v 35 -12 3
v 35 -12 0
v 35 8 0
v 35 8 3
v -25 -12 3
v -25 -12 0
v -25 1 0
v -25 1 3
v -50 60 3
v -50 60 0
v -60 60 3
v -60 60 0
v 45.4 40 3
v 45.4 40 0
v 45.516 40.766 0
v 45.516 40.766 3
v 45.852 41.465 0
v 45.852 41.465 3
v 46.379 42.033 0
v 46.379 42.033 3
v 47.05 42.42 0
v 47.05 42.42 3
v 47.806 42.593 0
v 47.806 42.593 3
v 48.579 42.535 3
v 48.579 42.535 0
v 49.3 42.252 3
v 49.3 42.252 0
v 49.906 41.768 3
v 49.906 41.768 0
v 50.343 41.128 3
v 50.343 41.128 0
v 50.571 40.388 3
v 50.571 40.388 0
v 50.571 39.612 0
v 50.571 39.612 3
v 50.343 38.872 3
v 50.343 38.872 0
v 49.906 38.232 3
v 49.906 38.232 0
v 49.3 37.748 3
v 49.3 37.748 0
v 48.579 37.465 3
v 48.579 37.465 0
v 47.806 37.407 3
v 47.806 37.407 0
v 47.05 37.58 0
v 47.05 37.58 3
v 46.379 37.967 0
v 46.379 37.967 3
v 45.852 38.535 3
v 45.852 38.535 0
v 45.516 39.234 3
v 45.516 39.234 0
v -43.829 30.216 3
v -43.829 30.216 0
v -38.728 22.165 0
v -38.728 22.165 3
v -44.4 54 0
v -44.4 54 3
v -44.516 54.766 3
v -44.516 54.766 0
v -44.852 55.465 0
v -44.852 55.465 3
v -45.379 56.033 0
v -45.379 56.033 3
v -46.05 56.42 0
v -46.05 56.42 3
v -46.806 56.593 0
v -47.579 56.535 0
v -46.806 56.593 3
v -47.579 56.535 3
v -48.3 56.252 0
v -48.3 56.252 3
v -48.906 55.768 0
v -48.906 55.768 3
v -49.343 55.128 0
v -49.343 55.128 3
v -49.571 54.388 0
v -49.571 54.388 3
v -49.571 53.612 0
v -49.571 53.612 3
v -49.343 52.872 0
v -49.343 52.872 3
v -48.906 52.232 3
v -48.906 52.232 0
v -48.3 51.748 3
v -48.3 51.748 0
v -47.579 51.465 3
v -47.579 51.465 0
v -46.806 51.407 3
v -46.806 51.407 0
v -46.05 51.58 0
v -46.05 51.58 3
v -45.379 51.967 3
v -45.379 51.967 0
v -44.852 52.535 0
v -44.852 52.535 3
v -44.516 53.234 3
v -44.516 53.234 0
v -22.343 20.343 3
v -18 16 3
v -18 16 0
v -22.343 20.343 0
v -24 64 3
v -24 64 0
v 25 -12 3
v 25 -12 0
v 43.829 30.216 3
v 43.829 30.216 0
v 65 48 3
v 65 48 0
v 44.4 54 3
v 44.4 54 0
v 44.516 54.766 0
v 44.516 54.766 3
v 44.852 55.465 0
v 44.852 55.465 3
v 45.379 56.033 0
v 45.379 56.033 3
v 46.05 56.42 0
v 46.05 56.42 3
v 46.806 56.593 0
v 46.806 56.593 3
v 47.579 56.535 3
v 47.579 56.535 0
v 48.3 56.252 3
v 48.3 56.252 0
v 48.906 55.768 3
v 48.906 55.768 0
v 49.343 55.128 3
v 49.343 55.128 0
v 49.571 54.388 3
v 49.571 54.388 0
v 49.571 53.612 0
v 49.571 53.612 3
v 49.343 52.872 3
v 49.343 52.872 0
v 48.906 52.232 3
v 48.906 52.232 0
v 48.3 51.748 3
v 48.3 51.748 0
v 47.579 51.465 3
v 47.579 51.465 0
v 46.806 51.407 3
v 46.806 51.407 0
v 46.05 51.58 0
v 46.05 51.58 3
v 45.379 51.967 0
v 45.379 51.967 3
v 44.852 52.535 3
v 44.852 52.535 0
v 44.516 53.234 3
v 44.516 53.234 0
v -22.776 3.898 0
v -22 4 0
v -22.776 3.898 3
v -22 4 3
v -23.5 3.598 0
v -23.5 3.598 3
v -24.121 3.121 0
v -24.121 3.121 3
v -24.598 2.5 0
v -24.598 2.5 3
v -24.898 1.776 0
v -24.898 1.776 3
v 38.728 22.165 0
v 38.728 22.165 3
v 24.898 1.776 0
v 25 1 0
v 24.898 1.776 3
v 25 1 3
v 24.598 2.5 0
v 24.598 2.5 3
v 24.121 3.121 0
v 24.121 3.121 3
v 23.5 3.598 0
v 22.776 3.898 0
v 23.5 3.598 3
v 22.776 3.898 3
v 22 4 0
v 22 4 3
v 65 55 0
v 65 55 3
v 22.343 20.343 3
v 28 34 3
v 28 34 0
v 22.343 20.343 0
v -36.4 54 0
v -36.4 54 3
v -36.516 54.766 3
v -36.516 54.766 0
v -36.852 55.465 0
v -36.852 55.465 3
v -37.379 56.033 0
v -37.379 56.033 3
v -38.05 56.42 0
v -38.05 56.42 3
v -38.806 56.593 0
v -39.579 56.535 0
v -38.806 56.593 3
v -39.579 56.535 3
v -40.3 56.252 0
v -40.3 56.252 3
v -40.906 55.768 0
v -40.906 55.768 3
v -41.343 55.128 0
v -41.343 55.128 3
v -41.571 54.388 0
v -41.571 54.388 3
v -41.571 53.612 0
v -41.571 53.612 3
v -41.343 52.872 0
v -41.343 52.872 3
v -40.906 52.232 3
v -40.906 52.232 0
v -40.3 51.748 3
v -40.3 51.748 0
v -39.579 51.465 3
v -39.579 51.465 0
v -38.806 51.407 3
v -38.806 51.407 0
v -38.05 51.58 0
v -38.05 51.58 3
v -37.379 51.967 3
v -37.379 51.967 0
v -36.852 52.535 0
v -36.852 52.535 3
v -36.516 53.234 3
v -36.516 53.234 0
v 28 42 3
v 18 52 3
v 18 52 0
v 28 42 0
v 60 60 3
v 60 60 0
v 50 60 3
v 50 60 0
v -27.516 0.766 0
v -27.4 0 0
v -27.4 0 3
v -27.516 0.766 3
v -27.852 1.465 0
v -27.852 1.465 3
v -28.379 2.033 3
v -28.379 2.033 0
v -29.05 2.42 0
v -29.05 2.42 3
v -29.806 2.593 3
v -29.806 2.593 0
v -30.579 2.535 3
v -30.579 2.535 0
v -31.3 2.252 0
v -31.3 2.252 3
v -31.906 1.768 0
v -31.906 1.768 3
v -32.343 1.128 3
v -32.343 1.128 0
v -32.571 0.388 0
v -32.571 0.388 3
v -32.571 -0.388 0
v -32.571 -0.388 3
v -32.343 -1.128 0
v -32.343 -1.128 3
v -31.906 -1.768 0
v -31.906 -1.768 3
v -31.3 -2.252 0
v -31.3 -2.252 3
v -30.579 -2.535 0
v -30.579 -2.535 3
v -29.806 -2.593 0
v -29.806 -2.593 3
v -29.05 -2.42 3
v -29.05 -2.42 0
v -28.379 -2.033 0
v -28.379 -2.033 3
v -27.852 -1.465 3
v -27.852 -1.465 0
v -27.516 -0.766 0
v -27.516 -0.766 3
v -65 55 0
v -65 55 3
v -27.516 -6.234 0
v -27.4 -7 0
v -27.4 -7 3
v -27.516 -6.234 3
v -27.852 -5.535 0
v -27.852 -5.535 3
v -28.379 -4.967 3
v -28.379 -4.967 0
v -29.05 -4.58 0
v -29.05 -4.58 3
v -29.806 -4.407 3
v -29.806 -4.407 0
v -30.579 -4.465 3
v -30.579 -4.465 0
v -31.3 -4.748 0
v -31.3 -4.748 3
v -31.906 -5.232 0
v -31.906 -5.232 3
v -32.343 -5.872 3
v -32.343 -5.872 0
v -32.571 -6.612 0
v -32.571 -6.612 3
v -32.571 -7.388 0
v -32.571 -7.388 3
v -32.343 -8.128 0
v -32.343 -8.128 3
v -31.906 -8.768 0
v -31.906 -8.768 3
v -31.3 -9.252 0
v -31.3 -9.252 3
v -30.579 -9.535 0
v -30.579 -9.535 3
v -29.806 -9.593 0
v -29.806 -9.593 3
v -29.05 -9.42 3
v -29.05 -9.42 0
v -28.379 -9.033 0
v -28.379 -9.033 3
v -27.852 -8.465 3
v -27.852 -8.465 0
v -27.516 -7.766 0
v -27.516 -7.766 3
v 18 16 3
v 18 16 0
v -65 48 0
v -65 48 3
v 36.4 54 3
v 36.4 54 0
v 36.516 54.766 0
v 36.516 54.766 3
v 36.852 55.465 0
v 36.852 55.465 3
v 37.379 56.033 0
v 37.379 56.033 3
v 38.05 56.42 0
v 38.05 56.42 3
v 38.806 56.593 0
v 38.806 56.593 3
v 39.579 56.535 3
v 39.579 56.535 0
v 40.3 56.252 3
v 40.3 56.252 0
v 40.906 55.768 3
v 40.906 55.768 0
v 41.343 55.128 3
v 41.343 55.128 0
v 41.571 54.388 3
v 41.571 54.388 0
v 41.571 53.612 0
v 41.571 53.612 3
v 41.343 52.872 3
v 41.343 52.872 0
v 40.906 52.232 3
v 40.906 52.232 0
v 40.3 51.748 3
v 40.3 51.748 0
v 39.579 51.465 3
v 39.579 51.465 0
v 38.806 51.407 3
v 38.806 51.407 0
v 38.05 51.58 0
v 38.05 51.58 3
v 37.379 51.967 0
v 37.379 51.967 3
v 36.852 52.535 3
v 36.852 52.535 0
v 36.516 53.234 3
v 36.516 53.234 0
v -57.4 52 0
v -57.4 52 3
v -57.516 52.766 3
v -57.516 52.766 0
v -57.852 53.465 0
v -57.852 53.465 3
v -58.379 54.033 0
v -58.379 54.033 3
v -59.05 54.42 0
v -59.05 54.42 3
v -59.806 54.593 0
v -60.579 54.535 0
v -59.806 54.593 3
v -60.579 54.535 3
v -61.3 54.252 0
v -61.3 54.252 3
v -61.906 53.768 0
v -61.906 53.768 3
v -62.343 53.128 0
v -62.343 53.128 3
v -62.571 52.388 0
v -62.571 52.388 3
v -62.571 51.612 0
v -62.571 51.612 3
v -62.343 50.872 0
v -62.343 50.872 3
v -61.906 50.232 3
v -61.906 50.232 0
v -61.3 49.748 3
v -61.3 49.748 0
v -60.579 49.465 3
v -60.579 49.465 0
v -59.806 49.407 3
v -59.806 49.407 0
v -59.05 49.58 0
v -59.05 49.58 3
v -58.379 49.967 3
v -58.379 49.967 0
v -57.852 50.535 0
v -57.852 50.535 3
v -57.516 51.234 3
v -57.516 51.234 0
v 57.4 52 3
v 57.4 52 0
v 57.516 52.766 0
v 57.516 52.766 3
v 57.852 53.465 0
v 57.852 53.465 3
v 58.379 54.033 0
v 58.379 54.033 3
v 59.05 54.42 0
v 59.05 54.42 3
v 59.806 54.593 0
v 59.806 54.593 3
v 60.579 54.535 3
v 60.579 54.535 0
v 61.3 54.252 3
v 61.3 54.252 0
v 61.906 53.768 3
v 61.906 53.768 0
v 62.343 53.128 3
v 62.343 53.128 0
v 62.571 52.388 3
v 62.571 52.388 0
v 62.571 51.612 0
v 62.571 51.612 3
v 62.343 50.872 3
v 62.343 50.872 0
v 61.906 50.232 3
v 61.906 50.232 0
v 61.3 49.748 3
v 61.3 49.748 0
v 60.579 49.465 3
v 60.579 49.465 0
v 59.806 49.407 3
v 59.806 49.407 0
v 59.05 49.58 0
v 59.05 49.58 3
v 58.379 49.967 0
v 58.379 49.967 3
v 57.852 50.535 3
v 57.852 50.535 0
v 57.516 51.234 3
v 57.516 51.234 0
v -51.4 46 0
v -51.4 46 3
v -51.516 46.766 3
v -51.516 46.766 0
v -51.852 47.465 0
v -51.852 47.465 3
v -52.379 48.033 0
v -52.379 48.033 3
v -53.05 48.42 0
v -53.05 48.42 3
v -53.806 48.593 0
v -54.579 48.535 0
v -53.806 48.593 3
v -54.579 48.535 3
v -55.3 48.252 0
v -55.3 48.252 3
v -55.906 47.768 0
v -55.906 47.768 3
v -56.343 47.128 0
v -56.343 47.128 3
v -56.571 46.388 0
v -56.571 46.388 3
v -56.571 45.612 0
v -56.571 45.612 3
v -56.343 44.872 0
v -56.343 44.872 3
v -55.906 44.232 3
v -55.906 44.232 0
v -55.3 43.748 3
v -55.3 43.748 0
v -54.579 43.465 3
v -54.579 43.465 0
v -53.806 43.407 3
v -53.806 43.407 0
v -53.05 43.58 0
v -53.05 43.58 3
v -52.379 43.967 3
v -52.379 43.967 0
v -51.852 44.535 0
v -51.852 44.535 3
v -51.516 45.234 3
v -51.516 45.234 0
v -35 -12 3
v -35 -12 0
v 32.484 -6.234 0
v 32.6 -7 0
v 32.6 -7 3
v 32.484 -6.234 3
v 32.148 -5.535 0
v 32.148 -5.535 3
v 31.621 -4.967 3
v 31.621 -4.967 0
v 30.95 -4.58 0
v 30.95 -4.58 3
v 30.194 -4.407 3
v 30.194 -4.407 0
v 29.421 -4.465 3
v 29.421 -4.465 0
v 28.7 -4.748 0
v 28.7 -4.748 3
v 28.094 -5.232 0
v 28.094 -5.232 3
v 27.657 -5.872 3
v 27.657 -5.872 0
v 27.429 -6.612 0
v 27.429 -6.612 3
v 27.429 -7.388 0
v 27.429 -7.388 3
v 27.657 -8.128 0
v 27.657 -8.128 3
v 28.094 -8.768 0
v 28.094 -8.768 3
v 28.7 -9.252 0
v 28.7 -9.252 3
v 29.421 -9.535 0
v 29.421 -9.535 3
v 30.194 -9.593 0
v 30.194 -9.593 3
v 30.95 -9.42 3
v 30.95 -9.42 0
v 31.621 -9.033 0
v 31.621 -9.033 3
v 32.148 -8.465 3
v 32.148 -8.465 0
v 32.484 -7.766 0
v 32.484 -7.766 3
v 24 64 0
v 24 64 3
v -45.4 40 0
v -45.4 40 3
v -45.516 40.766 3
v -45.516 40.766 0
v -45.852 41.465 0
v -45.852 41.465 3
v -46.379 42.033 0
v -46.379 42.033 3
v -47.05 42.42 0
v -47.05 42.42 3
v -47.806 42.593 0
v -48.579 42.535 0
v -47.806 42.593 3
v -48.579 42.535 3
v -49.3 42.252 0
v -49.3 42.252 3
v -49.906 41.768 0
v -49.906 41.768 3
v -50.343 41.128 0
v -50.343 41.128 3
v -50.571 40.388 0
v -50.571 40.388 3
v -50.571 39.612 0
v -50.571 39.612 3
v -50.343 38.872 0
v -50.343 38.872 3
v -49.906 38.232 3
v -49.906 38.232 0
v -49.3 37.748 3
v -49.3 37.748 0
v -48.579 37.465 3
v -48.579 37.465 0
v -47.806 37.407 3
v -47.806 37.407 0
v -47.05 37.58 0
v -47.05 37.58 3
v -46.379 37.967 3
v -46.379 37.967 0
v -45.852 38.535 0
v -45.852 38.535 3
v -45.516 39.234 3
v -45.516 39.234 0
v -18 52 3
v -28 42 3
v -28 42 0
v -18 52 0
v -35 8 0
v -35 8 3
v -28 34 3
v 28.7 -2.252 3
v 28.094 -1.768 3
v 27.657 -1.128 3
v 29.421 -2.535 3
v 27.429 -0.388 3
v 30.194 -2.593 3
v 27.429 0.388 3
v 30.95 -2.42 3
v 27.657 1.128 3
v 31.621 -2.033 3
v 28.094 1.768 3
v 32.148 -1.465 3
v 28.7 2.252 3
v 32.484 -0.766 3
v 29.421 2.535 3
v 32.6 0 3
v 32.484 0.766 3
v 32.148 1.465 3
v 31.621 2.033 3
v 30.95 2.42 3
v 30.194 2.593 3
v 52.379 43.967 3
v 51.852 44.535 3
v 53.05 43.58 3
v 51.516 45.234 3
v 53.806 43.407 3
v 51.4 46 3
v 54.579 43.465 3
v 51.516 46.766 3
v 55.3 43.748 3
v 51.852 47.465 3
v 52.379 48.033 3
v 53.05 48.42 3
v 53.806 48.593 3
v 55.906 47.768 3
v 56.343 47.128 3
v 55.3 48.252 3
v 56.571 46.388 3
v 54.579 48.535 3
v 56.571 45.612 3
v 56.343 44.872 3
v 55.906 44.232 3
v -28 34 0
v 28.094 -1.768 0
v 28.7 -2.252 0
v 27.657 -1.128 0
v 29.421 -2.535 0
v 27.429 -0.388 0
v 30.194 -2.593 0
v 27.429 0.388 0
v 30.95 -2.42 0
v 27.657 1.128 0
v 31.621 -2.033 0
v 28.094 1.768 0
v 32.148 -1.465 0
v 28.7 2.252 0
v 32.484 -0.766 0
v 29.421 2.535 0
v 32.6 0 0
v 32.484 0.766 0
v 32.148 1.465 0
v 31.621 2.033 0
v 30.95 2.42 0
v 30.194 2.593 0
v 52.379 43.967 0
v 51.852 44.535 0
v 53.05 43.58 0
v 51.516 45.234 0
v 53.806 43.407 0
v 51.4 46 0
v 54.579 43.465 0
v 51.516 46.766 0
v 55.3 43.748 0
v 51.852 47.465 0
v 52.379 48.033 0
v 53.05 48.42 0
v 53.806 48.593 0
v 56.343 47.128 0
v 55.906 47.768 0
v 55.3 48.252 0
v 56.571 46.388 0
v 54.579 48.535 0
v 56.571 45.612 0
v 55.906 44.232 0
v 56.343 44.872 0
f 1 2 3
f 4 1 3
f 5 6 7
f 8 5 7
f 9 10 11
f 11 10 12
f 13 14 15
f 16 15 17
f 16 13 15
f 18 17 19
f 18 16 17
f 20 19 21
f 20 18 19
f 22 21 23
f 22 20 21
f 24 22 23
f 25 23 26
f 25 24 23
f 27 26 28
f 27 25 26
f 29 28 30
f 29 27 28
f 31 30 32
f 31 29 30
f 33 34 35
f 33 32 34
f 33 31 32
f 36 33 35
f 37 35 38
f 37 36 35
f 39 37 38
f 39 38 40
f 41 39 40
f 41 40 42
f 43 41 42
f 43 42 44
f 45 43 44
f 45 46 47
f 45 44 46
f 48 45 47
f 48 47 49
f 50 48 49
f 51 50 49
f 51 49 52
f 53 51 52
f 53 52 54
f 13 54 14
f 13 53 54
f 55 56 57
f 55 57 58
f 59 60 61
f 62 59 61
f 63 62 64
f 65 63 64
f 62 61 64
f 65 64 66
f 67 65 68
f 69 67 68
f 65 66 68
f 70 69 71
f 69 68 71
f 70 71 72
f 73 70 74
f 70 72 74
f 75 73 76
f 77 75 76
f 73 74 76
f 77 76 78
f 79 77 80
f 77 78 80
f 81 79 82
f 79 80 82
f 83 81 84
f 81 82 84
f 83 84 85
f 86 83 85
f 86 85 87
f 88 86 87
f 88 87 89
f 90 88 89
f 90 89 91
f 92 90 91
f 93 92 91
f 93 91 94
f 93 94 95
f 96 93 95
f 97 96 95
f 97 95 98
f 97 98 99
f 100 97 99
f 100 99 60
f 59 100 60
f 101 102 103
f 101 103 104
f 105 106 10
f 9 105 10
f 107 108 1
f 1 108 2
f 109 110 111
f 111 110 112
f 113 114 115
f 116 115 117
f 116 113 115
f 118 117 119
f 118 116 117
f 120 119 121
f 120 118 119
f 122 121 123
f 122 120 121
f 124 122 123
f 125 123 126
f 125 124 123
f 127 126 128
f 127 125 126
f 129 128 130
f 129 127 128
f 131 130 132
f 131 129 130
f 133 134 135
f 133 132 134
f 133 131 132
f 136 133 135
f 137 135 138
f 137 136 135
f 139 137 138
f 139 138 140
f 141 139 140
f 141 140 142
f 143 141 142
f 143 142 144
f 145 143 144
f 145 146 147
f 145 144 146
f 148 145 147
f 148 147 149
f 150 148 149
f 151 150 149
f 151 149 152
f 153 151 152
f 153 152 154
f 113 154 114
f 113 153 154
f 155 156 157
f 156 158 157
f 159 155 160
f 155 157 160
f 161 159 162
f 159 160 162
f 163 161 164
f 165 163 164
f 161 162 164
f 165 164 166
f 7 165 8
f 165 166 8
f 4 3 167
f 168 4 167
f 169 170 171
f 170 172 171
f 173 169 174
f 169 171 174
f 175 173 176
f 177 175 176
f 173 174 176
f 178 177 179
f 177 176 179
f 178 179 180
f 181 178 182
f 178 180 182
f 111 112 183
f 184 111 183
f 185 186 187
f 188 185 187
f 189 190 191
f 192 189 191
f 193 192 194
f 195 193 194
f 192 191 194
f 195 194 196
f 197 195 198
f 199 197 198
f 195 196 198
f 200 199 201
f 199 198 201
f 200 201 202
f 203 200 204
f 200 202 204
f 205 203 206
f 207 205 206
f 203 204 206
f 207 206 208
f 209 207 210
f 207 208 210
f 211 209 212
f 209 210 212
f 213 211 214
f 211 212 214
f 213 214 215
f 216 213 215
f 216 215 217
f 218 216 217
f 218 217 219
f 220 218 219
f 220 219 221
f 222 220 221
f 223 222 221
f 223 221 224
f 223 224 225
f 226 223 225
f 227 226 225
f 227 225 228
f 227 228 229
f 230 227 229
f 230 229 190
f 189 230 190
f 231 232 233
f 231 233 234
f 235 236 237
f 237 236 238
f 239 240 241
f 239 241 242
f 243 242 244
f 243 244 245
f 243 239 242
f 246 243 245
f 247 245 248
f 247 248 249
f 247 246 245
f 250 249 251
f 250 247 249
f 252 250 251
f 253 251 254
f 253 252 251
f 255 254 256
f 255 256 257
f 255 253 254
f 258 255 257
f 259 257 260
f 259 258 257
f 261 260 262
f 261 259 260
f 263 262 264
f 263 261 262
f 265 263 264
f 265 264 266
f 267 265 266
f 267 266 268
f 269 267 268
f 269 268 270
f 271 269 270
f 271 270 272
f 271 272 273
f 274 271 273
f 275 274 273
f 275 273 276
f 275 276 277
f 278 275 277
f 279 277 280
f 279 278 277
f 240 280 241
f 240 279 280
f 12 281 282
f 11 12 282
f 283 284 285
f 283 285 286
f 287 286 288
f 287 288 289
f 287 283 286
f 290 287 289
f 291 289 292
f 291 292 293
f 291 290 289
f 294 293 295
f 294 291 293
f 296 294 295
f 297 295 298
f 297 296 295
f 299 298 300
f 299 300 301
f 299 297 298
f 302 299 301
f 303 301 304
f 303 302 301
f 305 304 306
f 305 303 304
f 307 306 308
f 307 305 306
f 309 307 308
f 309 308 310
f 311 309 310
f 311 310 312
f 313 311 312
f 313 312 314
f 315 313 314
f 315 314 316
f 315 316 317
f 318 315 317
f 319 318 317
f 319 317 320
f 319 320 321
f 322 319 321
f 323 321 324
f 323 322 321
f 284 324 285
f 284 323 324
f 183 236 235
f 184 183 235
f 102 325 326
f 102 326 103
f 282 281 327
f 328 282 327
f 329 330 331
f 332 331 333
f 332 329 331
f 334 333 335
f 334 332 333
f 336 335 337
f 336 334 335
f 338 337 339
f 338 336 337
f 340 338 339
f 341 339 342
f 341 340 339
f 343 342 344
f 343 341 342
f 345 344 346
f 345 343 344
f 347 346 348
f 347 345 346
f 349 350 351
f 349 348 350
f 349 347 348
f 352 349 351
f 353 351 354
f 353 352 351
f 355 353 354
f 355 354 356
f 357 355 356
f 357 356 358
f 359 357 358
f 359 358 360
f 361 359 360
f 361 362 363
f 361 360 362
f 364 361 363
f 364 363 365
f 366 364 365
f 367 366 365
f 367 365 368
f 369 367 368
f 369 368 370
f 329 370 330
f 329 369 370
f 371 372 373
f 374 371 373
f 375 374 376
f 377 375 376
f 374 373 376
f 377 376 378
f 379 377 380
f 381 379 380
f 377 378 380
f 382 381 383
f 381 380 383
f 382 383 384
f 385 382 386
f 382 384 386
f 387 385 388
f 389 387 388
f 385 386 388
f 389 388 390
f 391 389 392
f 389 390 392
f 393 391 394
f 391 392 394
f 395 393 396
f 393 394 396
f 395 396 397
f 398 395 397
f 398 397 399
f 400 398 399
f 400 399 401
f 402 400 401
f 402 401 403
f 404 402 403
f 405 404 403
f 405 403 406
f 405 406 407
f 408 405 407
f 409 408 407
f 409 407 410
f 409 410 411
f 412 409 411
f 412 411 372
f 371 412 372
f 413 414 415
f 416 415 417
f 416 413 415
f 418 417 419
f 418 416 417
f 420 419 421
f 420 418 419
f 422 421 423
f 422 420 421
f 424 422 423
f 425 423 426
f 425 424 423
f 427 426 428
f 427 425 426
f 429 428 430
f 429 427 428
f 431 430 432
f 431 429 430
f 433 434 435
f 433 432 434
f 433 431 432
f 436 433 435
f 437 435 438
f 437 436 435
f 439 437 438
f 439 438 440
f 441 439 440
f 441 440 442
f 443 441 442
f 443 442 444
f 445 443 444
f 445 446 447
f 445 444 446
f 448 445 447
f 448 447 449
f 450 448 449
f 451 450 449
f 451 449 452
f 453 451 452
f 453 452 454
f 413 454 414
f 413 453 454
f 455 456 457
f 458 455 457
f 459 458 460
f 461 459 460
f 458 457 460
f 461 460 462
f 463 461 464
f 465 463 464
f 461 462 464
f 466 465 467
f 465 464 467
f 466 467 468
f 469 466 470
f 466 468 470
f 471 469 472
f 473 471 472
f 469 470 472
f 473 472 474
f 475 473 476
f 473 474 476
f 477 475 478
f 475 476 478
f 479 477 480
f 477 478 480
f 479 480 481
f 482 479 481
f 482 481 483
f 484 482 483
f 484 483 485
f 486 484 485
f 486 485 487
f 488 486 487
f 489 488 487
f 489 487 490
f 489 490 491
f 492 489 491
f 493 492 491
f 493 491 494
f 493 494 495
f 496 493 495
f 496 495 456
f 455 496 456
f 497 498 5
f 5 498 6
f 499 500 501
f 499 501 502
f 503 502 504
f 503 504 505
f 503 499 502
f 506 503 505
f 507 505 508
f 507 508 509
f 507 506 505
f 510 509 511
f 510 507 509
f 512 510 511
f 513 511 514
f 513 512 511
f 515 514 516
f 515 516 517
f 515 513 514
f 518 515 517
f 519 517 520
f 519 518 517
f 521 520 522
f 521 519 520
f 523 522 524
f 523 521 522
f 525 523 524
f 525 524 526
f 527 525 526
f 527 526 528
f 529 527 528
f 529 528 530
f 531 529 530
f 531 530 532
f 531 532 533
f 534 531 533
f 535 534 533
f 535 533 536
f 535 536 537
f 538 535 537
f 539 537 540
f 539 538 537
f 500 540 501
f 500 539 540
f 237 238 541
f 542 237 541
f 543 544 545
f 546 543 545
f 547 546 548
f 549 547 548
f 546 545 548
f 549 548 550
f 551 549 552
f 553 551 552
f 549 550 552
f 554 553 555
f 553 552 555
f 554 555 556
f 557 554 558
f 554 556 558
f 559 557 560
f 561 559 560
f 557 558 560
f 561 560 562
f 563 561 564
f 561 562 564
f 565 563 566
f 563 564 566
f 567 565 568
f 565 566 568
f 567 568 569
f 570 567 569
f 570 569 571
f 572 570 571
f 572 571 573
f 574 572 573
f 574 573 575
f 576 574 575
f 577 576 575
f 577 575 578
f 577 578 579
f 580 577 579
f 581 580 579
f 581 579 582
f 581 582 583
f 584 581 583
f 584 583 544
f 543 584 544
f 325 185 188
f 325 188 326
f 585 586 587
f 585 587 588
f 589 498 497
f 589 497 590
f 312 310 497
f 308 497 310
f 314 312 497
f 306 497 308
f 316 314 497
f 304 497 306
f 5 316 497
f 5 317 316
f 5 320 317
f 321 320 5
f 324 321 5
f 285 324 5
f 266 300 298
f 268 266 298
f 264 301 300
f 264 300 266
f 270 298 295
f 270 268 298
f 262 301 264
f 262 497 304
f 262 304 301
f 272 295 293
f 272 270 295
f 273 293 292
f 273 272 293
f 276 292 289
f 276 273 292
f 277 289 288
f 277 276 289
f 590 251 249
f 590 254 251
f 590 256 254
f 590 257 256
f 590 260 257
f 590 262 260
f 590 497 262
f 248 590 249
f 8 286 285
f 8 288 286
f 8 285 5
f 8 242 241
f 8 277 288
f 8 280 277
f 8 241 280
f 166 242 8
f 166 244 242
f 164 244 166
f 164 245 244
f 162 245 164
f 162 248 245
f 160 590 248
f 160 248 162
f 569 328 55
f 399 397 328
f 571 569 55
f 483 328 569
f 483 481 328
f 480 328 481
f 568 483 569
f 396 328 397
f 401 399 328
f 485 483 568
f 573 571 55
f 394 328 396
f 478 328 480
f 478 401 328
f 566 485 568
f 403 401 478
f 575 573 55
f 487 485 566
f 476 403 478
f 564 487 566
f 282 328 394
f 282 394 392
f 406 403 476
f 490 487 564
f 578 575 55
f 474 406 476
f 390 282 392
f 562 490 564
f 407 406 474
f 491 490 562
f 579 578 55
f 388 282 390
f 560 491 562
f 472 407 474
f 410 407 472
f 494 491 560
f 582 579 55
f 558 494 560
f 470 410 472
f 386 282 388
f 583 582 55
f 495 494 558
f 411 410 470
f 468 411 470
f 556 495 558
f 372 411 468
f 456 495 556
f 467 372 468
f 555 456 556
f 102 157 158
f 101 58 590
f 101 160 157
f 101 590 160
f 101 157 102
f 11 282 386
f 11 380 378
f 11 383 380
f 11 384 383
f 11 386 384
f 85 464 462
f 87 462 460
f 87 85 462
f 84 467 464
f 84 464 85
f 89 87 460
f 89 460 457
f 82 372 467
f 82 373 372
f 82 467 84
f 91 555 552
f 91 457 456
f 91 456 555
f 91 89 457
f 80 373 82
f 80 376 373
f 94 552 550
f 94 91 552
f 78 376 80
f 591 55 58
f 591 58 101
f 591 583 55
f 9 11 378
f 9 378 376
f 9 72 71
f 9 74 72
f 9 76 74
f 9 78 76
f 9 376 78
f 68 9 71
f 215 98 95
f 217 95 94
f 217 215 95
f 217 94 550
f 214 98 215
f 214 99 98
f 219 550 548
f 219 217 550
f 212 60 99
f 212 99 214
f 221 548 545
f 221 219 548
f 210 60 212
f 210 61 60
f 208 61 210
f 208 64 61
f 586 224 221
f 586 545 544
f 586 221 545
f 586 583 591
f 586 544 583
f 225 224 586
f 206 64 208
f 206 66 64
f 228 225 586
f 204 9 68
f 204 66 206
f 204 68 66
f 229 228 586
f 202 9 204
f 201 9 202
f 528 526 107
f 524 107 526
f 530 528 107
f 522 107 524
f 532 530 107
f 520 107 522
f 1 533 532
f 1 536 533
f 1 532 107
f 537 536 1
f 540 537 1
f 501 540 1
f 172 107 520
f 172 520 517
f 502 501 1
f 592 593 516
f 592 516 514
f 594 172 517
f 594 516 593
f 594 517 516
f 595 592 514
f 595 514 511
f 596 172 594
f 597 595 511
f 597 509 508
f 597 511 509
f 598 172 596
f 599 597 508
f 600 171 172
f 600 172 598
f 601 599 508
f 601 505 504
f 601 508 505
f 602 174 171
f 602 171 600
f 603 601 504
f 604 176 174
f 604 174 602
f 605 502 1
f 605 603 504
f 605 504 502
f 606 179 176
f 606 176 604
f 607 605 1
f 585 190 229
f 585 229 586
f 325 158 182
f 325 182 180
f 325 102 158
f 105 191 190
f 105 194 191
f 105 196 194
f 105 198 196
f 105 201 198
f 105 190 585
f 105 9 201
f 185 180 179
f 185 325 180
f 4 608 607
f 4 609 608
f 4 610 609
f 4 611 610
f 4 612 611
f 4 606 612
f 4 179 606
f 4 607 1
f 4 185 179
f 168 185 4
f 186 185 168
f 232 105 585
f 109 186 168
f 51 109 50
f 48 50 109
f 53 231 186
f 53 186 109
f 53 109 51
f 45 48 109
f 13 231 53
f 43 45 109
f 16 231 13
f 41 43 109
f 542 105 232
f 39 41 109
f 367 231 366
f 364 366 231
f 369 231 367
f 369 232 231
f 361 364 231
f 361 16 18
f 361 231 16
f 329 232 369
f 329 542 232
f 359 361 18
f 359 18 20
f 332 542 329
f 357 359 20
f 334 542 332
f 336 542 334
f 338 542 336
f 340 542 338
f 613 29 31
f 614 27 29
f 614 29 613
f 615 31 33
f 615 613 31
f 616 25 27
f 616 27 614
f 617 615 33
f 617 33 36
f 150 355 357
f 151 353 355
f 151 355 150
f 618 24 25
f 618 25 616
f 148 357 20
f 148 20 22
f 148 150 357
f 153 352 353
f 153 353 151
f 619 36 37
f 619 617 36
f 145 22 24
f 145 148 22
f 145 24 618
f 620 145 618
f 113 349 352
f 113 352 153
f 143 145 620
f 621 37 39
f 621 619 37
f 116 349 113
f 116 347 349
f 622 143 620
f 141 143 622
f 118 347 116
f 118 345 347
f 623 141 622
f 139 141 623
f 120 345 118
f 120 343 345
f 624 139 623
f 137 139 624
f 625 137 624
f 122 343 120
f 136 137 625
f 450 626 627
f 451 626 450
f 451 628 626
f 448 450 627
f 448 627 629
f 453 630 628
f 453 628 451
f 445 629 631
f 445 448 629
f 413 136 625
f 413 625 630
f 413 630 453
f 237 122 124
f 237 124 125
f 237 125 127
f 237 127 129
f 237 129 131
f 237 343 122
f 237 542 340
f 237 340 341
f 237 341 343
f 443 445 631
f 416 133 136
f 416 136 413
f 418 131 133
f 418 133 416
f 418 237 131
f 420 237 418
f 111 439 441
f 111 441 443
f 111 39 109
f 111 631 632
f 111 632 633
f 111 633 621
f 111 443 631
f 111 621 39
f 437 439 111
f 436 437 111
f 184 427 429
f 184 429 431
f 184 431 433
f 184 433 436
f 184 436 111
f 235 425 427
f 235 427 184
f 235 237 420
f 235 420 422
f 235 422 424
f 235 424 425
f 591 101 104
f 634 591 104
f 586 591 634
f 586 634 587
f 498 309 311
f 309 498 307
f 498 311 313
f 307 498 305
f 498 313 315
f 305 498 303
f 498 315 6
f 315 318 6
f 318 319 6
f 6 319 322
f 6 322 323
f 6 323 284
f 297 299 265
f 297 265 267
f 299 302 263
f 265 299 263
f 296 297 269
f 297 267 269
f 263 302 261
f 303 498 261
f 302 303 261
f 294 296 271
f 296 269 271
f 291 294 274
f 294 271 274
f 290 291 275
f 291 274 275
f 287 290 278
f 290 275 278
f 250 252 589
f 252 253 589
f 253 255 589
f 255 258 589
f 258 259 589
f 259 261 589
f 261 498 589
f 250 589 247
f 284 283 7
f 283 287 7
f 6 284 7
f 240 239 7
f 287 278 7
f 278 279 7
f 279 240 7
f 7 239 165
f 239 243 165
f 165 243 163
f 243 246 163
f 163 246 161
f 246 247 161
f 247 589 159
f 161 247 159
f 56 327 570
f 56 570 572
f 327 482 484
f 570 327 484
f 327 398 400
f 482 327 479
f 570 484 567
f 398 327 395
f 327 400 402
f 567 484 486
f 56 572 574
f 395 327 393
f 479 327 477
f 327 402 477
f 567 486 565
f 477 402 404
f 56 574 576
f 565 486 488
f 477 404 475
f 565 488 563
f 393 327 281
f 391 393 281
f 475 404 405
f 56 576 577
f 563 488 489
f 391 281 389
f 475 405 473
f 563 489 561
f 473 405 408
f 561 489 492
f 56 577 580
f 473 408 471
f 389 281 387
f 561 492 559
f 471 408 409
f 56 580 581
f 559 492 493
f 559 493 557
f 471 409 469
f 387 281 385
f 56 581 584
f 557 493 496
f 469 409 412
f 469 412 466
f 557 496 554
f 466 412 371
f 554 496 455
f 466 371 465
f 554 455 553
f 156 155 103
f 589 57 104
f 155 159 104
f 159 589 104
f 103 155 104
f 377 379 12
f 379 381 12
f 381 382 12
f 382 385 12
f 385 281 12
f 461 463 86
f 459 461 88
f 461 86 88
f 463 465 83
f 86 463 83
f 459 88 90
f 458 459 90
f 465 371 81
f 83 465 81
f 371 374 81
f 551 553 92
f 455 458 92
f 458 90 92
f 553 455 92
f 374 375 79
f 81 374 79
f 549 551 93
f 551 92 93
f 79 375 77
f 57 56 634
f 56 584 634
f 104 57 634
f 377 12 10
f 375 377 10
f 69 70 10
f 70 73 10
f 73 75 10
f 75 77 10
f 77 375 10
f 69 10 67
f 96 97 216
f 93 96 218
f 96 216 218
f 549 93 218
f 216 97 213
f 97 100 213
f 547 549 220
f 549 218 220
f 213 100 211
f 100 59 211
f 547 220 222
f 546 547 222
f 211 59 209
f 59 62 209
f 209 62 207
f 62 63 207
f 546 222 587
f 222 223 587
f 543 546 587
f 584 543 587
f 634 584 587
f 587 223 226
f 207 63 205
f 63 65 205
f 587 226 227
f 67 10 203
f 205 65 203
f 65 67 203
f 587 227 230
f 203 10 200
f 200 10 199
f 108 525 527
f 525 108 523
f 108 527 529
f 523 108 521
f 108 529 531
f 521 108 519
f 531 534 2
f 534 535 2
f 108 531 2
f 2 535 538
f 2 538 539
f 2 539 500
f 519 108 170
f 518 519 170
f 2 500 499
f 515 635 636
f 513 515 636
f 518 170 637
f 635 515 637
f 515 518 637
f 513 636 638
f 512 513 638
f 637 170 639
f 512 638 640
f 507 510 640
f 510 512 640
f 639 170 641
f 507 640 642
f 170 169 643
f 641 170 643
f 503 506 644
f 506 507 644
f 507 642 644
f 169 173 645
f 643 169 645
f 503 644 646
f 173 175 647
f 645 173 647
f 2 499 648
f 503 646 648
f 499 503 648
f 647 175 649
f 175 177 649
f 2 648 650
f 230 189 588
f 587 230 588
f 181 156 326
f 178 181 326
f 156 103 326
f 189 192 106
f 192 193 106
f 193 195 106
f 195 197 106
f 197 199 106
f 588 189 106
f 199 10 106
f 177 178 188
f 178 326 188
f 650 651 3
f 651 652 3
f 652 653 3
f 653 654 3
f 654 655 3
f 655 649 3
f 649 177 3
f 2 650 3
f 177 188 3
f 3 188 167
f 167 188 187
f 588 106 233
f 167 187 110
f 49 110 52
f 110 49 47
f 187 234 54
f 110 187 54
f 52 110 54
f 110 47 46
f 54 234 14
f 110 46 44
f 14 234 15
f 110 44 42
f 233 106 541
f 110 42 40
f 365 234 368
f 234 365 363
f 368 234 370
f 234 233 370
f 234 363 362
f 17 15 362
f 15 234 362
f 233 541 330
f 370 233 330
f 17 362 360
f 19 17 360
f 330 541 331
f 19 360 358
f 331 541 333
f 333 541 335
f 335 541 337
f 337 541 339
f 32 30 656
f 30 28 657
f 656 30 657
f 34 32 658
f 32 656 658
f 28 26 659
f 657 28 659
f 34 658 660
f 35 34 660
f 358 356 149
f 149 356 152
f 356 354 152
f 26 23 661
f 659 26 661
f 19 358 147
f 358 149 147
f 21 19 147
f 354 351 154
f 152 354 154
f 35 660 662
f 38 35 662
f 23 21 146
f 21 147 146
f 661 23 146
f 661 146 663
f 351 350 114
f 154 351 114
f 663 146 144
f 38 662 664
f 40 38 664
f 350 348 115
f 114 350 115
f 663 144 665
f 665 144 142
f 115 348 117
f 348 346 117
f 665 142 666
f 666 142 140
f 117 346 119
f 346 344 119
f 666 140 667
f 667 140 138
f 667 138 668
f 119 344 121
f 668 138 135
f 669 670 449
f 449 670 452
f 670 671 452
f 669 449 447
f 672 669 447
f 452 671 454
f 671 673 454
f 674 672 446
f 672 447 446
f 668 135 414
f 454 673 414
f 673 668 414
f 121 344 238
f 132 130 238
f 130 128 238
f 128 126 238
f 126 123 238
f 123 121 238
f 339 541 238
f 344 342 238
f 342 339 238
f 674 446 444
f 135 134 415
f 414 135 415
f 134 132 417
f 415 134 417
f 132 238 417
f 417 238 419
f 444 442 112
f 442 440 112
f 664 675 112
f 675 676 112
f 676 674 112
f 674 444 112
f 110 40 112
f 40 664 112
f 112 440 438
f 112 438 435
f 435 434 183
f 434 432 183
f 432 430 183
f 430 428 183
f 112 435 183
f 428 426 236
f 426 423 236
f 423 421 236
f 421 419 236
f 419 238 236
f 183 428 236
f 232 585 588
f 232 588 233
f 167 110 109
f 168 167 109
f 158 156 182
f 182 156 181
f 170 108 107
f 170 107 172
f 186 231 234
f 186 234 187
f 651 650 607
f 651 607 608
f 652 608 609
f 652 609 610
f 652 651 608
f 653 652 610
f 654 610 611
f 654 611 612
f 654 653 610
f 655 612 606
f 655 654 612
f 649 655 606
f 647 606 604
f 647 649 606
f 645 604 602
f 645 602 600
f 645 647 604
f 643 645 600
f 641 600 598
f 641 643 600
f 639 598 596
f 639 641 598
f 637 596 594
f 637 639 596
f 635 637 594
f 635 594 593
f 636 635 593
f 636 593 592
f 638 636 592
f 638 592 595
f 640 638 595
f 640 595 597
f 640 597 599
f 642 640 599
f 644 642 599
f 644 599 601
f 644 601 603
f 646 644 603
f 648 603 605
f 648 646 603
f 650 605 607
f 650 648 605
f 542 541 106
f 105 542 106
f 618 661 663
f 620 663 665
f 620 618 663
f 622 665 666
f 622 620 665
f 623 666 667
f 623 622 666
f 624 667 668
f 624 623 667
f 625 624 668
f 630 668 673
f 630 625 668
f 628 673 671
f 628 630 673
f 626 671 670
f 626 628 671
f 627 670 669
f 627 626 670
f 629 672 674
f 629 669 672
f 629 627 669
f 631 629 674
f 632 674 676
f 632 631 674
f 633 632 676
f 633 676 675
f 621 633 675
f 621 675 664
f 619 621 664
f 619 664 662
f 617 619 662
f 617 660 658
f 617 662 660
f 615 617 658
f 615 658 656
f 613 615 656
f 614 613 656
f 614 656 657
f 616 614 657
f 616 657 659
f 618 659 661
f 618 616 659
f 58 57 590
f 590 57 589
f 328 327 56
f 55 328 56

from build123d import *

# Parameters (mm, degrees)
SKETCH_1_W          = 10
SKETCH_1_H          = 20
SKETCH_1_R          = 2.6
EXTRUDE_1_DEPTH     = 3
CUT_EXTRUDE_1_DEPTH = 3
FILLET_2_R          = 3
CHAMFER_3_SIZE      = 5
CHAMFER_4_SIZE      = 5
CHAMFER_5_SIZE      = 5
SKETCH_4_R          = 2.6
CUT_EXTRUDE_2_DEPTH = 92.268833673
CHAMFER_8_SIZE      = 8
CHAMFER_9_SIZE      = 8


with BuildPart() as part:
    # 草图1 → 凸台-拉伸1 (new body)
    # profile 1 of 3: a face of its own
    with BuildSketch(Plane.XY):
        Polygon((-40, 27), (-35, 8), (-25, 8), (-25, 4), (25, 4), (25, 8), (35, 8), (40, 27), (65, 48), (65, 60), (50, 60), (24, 64), (-24, 64), (-50, 60), (-65, 60), (-65, 48), align=None)
    # profile 2 of 3: a face of its own
    with BuildSketch(Plane.XY):
        with Locations((-30, -2)):
            Rectangle(SKETCH_1_W, SKETCH_1_H)
        with Locations((-30, -7)):
            Circle(SKETCH_1_R, mode=Mode.SUBTRACT)
        with Locations((-30, 0)):
            Circle(SKETCH_1_R, mode=Mode.SUBTRACT)
    # profile 3 of 3: a face of its own
    with BuildSketch(Plane.XY):
        with Locations((30, -2)):
            Rectangle(SKETCH_1_W, SKETCH_1_H)
        with Locations((30, -7)):
            Circle(SKETCH_1_R, mode=Mode.SUBTRACT)
        with Locations((30, 0)):
            Circle(SKETCH_1_R, mode=Mode.SUBTRACT)
    extrude(amount=EXTRUDE_1_DEPTH)

    # 草图2 → 切除-拉伸1 (cut)
    with BuildSketch(Plane.XY.offset(3)):
        Polygon((-18, 52), (18, 52), (28, 42), (28, 26), (18, 16), (-18, 16), (-28, 26), (-28, 42), align=None)
    extrude(amount=-CUT_EXTRUDE_1_DEPTH, mode=Mode.SUBTRACT)

    # 圆角2
    fillet_2_edges = [part.edges().sort_by_distance(p)[0] for p in [
        (25, 4, 1.5),
        (-25, 4, 1.5),
    ]]
    fillet(fillet_2_edges, radius=FILLET_2_R)

    # 倒角3
    chamfer_3_edges = [part.edges().sort_by_distance(p)[0] for p in [
        (-40, 27, 1.5),
    ]]
    chamfer(chamfer_3_edges, length=CHAMFER_3_SIZE)

    # 倒角4
    chamfer_4_edges = [part.edges().sort_by_distance(p)[0] for p in [
        (40, 27, 1.5),
    ]]
    chamfer(chamfer_4_edges, length=CHAMFER_4_SIZE)

    # 倒角5
    chamfer_5_edges = [part.edges().sort_by_distance(p)[0] for p in [
        (-65, 60, 1.5),
        (65, 60, 1.5),
    ]]
    chamfer(chamfer_5_edges, length=CHAMFER_5_SIZE)

    # 草图4 → 切除-拉伸2 (cut, through all)
    with BuildSketch(Plane.XY.offset(3)):
        with Locations((-60, 52)):
            Circle(SKETCH_4_R)
        with Locations((-54, 46)):
            Circle(SKETCH_4_R)
        with Locations((-47, 54)):
            Circle(SKETCH_4_R)
        with Locations((-48, 40)):
            Circle(SKETCH_4_R)
        with Locations((-39, 54)):
            Circle(SKETCH_4_R)
    cut_extrude_2 = extrude(amount=-CUT_EXTRUDE_2_DEPTH, mode=Mode.SUBTRACT)

    # 镜向4: 切除-拉伸2 across plane
    add(cut_extrude_2.mirror(Plane(origin=(0, 0, 0), x_dir=(0, 0, 1), z_dir=(1, 0, 0))), mode=Mode.SUBTRACT)

    # 倒角8
    chamfer_8_edges = [part.edges().sort_by_distance(p)[0] for p in [
        (-28, 26, 1.5),
    ]]
    chamfer(chamfer_8_edges, length=CHAMFER_8_SIZE)

    # 倒角9
    chamfer_9_edges = [part.edges().sort_by_distance(p)[0] for p in [
        (28, 26, 1.5),
    ]]
    chamfer(chamfer_9_edges, length=CHAMFER_9_SIZE)


solid = part.part
